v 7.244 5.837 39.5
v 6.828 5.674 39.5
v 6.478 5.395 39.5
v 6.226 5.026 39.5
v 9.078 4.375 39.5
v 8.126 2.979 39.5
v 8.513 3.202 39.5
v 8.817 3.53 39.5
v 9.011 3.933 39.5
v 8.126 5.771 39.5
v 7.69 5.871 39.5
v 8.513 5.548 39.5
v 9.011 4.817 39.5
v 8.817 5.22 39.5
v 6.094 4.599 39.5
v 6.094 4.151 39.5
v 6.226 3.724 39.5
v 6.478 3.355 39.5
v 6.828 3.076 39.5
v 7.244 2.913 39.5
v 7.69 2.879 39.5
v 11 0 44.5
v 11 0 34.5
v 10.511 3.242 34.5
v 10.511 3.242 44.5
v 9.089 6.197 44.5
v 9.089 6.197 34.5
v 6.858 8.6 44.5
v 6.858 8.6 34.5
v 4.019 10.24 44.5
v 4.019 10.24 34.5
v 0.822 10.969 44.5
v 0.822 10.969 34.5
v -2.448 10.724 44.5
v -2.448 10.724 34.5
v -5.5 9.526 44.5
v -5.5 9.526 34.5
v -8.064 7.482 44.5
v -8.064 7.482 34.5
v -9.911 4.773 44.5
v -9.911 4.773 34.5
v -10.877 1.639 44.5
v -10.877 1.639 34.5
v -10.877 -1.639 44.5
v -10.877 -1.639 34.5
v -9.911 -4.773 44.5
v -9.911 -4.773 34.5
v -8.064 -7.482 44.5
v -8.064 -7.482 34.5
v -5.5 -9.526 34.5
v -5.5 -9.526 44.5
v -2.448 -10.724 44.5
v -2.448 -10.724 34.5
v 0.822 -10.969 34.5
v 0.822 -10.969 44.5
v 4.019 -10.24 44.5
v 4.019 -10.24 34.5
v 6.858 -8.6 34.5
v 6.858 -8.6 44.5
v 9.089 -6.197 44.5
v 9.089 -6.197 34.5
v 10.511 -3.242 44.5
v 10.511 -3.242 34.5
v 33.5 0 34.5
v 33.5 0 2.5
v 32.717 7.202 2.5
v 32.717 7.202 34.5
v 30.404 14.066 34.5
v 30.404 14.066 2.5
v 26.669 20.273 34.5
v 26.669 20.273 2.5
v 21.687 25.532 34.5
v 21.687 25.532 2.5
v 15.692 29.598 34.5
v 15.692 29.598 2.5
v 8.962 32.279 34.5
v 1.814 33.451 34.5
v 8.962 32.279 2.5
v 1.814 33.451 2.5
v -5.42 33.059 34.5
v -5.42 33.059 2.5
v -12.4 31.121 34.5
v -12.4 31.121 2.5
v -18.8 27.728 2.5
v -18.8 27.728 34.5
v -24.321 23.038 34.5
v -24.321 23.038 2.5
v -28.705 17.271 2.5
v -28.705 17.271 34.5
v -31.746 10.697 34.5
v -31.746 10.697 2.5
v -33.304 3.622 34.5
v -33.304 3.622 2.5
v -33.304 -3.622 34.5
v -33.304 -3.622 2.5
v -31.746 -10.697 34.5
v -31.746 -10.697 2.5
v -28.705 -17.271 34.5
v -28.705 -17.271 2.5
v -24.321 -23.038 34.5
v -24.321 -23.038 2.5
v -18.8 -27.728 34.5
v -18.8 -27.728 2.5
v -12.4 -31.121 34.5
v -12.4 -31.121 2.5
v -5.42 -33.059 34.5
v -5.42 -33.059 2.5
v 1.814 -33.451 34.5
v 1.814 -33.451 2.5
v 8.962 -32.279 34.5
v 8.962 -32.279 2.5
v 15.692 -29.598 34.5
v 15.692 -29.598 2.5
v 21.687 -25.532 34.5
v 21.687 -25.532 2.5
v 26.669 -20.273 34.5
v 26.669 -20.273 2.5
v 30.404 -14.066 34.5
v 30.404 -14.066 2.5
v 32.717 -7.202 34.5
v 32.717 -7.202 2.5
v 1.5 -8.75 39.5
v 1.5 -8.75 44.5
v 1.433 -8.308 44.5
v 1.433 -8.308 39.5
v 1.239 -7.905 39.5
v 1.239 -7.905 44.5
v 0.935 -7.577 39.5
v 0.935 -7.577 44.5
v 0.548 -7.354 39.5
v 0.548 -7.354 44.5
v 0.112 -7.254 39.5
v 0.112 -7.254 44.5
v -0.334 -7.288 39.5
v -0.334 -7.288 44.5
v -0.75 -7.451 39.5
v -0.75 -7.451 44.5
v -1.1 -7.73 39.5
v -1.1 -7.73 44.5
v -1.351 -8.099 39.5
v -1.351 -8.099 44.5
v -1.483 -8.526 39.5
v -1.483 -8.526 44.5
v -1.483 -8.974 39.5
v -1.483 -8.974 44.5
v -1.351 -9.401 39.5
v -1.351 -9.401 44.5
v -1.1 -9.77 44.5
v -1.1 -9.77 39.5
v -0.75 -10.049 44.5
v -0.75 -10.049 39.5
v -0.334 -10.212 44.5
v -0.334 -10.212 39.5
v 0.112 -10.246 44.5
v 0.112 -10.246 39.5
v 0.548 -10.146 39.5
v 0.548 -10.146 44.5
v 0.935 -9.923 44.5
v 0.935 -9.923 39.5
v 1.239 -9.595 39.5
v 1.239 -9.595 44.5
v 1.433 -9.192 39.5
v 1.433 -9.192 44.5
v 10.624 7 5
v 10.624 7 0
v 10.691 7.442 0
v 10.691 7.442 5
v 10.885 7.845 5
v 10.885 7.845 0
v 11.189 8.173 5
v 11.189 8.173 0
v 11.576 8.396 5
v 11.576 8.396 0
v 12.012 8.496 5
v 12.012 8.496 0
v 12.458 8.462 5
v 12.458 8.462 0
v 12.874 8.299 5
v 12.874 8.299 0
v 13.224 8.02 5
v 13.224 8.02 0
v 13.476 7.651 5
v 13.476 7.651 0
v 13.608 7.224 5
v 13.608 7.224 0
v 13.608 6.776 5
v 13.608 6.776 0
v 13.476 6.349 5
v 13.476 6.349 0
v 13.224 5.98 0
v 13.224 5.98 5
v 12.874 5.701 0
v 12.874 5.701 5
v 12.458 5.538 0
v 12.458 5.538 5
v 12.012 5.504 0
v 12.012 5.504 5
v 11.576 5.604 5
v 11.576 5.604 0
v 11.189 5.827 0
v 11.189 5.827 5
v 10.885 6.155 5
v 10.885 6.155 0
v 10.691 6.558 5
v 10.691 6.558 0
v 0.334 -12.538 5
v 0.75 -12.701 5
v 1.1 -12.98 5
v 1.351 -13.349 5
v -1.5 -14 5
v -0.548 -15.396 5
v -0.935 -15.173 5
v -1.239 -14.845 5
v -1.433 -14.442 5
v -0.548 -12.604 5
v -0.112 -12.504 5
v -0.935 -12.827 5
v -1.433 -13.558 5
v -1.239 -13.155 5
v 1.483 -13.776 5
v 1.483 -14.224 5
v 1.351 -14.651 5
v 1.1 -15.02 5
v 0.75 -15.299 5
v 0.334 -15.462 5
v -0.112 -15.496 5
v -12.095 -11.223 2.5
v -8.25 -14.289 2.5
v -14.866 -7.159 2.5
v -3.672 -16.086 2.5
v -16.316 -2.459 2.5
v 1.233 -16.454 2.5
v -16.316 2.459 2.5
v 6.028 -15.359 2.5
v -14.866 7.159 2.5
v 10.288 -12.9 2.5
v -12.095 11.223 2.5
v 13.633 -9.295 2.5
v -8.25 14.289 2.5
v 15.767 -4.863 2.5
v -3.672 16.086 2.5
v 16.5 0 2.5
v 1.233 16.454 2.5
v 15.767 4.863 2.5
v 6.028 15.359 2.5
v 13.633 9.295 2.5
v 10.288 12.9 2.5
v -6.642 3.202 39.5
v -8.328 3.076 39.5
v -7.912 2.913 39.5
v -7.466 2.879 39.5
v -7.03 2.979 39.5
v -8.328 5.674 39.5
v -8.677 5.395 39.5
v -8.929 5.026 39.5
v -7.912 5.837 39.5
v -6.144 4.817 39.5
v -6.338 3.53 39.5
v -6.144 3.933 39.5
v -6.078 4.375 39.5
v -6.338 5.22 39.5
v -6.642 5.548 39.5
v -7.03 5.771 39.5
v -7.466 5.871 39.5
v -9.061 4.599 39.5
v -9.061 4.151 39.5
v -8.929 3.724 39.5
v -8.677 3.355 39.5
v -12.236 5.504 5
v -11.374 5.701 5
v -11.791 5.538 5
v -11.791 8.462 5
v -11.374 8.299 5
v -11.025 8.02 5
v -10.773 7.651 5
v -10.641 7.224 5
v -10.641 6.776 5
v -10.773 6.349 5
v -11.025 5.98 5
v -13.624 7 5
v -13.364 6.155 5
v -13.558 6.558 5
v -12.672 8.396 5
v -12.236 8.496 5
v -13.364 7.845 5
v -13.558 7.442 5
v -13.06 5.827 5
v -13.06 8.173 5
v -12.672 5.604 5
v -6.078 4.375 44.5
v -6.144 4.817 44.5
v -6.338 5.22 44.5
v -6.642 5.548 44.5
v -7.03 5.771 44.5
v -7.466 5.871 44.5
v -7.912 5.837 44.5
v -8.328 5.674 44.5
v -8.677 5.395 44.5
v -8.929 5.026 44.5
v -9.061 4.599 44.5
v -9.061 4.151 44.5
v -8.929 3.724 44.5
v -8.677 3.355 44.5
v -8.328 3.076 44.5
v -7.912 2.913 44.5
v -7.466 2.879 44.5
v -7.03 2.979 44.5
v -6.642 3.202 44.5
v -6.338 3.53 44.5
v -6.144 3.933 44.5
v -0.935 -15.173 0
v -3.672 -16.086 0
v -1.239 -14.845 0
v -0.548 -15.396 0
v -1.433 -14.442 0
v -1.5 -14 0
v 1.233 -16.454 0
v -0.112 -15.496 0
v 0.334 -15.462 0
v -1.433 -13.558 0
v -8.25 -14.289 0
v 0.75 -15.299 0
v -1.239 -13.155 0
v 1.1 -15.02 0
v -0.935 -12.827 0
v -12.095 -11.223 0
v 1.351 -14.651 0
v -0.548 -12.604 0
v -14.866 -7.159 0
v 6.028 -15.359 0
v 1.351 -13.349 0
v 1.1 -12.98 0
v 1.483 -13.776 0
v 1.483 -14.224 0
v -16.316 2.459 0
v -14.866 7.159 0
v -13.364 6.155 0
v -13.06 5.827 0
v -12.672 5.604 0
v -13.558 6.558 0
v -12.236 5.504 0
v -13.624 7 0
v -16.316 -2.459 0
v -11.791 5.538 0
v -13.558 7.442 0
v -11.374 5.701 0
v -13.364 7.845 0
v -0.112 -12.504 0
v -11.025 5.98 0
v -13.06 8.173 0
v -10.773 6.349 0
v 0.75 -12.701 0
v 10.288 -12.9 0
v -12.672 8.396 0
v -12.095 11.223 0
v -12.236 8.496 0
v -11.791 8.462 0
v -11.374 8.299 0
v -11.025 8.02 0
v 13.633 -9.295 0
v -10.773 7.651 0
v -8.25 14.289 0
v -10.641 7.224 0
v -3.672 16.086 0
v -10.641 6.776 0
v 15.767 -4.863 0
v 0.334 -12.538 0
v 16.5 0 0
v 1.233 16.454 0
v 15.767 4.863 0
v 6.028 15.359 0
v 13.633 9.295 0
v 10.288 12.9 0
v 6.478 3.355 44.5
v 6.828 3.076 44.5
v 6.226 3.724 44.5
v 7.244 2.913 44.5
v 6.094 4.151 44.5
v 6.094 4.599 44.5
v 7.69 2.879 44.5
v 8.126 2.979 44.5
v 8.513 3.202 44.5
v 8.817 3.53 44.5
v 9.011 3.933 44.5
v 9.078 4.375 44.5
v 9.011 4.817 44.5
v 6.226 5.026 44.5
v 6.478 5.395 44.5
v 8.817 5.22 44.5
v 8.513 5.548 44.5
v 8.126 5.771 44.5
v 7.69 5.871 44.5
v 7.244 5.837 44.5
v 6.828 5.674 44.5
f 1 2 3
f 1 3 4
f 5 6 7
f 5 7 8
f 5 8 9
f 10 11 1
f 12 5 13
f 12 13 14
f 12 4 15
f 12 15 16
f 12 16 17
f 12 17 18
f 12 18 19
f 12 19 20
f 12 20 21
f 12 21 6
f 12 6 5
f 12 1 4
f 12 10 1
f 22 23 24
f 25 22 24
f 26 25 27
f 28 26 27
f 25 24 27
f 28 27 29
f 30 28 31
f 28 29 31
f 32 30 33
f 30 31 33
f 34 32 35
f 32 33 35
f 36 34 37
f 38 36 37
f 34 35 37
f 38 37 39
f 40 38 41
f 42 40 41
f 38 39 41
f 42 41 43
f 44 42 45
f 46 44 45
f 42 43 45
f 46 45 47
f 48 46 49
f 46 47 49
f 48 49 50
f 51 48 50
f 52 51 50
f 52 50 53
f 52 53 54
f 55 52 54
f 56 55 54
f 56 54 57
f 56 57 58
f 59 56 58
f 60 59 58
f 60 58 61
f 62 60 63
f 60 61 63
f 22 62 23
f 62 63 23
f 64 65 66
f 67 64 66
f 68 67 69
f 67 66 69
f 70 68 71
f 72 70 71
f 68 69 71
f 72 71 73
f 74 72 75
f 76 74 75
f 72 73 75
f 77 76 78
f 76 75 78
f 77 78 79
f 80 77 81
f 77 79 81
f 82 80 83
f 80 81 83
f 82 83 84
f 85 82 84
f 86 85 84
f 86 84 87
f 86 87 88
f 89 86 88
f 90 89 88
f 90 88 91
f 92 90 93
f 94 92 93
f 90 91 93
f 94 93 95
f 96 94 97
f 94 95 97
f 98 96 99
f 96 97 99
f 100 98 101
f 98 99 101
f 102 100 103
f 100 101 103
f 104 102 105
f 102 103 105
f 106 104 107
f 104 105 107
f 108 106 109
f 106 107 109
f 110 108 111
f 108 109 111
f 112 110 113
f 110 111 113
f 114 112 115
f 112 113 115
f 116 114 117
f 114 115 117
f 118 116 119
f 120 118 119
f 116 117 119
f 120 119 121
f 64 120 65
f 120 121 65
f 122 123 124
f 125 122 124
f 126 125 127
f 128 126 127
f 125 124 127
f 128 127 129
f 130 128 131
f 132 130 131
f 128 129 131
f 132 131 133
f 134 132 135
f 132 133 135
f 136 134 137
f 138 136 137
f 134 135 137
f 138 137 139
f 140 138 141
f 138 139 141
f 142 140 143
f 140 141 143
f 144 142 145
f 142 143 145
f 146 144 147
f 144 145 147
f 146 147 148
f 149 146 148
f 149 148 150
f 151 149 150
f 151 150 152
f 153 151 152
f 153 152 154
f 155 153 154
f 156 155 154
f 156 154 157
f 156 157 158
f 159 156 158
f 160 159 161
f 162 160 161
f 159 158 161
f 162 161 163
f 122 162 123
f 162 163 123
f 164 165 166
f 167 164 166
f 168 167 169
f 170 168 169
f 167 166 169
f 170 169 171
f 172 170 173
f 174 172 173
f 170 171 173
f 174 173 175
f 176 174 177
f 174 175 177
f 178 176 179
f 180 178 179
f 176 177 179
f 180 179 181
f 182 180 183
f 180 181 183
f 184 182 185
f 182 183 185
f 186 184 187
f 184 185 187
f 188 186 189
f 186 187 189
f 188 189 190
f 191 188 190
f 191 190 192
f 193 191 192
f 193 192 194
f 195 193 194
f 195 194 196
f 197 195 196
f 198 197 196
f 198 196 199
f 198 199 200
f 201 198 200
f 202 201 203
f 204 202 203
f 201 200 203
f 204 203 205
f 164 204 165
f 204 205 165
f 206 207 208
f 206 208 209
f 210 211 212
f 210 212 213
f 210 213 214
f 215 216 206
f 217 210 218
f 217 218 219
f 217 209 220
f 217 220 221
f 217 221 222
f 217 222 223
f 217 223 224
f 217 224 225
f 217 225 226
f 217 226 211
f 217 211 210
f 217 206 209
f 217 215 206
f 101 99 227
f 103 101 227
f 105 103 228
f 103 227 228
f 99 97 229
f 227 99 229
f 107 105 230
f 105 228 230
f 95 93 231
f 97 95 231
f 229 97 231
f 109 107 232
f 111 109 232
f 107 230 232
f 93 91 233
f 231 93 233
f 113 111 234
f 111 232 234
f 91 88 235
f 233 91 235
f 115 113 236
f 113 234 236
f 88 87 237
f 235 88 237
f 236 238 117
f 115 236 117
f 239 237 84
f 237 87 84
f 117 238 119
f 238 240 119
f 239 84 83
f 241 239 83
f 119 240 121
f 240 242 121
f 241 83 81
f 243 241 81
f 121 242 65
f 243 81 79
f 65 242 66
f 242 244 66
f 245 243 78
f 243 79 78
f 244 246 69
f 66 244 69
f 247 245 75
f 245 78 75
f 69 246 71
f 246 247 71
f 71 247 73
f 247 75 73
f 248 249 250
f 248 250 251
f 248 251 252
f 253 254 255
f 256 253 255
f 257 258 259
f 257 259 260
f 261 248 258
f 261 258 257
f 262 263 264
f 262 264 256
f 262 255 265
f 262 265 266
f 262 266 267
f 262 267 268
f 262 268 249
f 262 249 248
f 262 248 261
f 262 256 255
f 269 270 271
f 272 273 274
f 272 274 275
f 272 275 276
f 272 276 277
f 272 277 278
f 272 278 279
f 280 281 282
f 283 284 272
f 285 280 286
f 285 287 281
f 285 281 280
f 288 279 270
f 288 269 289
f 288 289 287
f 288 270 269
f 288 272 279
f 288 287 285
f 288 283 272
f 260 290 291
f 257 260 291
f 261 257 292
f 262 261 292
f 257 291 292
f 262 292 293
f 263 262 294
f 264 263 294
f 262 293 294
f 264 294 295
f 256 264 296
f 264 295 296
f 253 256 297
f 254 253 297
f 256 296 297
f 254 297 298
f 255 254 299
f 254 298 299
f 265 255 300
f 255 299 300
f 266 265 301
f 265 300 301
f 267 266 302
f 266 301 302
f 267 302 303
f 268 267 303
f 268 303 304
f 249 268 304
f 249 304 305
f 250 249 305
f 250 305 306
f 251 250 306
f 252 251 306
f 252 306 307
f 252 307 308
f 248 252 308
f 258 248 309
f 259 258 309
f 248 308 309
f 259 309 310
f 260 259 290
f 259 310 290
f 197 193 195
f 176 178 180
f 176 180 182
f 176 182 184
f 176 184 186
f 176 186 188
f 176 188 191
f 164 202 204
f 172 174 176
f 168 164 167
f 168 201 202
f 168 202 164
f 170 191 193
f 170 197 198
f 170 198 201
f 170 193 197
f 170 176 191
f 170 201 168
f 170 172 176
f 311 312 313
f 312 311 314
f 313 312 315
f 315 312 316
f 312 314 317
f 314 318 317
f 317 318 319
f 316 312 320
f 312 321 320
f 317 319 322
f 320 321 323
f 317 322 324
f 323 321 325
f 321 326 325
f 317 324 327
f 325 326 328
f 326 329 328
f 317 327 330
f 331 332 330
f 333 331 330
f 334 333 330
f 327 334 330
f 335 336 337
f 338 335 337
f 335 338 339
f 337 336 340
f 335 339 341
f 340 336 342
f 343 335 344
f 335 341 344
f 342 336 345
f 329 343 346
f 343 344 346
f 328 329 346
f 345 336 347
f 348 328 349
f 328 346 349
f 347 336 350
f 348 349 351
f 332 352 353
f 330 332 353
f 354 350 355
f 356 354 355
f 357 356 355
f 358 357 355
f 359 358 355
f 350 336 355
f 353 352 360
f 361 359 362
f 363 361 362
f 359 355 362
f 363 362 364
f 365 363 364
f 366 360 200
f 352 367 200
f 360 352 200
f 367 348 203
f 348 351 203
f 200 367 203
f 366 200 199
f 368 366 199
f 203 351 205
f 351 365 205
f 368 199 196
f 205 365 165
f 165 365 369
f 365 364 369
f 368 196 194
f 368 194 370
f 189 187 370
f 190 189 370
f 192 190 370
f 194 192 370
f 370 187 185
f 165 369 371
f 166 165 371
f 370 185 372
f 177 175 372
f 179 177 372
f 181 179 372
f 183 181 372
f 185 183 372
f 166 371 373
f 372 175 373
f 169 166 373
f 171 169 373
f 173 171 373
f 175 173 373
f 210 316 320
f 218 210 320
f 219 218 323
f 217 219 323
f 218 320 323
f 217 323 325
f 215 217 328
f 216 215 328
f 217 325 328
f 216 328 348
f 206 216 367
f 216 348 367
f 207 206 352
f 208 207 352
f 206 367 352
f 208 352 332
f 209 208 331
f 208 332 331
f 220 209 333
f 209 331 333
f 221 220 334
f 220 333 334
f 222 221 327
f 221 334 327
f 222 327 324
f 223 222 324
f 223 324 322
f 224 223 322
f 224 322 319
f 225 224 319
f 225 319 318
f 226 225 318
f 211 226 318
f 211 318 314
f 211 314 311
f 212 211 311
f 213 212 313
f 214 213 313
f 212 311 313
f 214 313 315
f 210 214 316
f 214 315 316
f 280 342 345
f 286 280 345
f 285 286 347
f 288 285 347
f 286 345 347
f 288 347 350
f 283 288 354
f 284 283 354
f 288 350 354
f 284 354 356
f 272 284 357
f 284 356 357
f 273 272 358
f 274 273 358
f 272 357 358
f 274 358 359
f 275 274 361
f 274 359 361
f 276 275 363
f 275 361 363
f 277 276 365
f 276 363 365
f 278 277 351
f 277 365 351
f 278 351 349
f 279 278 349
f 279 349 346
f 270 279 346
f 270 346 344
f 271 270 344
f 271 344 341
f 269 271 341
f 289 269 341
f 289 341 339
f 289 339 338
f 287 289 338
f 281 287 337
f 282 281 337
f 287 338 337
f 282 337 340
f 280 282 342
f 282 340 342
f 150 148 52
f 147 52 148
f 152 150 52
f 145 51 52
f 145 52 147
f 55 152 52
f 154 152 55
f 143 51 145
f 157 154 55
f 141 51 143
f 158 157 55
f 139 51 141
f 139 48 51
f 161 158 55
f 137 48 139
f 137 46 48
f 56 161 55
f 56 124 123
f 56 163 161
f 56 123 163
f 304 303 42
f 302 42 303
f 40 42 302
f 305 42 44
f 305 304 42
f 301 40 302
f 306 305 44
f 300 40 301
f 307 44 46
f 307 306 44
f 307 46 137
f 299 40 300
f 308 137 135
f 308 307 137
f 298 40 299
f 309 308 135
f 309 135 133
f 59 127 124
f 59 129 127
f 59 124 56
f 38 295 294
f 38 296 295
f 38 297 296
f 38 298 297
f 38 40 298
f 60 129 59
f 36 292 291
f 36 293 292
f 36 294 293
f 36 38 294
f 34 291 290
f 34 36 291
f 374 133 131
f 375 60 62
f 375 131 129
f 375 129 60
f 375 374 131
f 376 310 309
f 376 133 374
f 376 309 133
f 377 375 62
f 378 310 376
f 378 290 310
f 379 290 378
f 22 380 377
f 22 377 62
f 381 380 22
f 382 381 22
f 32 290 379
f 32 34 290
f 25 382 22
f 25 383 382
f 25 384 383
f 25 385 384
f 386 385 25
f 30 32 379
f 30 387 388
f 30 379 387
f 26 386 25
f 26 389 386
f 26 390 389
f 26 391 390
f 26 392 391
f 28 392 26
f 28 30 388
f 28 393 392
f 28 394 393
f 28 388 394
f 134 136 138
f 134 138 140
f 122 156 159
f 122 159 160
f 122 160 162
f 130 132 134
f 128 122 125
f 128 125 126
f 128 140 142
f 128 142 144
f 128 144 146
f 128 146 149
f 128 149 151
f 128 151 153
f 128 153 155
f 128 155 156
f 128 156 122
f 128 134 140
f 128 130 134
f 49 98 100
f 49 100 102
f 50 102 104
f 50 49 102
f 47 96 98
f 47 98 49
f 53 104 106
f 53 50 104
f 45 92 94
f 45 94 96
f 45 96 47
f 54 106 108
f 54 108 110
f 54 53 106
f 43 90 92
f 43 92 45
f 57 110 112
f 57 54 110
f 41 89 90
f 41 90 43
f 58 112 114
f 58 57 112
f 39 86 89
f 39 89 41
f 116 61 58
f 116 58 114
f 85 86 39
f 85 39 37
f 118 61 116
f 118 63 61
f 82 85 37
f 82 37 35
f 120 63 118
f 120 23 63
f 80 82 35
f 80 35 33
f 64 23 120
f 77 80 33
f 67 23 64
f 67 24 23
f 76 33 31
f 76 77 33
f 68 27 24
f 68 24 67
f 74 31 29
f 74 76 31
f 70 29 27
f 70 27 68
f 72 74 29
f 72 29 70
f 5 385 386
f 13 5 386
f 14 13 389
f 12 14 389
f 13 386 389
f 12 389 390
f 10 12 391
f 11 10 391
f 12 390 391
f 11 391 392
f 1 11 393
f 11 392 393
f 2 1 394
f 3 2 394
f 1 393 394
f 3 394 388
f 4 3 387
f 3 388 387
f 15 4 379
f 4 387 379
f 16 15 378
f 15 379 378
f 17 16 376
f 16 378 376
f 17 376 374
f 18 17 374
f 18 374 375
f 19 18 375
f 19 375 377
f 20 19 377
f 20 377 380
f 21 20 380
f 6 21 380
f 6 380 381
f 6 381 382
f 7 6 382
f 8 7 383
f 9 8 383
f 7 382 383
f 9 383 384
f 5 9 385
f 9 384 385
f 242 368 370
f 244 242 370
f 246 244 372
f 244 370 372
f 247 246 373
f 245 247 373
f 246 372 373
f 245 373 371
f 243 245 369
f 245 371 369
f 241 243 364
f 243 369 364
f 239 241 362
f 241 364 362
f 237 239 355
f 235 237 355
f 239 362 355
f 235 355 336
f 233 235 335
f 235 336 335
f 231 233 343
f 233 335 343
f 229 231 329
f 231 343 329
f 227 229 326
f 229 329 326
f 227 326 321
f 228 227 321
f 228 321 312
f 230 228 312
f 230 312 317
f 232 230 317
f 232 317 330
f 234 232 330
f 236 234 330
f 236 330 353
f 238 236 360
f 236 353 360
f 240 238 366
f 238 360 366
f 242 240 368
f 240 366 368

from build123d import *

# Parameters (mm, degrees)
SKETCH_1_R          = 16.5
EXTRUDE_1_DEPTH     = 2.5
SKETCH_2_R          = 33.5
EXTRUDE_2_DEPTH     = 32
SKETCH_3_R          = 11
EXTRUDE_3_DEPTH     = 10
SKETCH_4_R          = 1.5
CUT_EXTRUDE_1_DEPTH = 5
SKETCH_5_R          = 1.5
CUT_EXTRUDE_2_DEPTH = 5


with BuildPart() as part:
    # 草图1 → 凸台-拉伸1 (new body)
    with BuildSketch(Plane.XY):
        Circle(SKETCH_1_R)
    extrude(amount=EXTRUDE_1_DEPTH)

    # 草图2 → 凸台-拉伸2 (add)
    with BuildSketch(Plane.XY.offset(2.5)):
        Circle(SKETCH_2_R)
    extrude(amount=EXTRUDE_2_DEPTH)

    # 草图3 → 凸台-拉伸3 (add)
    with BuildSketch(Plane.XY.offset(34.5)):
        Circle(SKETCH_3_R)
    extrude(amount=EXTRUDE_3_DEPTH)

    # 草图4 → 切除-拉伸1 (cut)
    with BuildSketch(Plane.XY.offset(44.5)):
        with Locations((7.577722283, 4.375)):
            Circle(SKETCH_4_R)
        with Locations((-7.577722283, 4.375)):
            Circle(SKETCH_4_R)
        with Locations((0, -8.75)):
            Circle(SKETCH_4_R)
    extrude(amount=-CUT_EXTRUDE_1_DEPTH, mode=Mode.SUBTRACT)

    # 草图5 → 切除-拉伸2 (cut)
    with BuildSketch(Plane(origin=(0, 0, 0), x_dir=(-1, 0, 0), z_dir=(0, 0, -1))):
        with Locations((0, -14)):
            Circle(SKETCH_5_R)
        with Locations((-12.124355653, 7)):
            Circle(SKETCH_5_R)
        with Locations((12.124355653, 7)):
            Circle(SKETCH_5_R)
    extrude(amount=-CUT_EXTRUDE_2_DEPTH, mode=Mode.SUBTRACT)


solid = part.part
